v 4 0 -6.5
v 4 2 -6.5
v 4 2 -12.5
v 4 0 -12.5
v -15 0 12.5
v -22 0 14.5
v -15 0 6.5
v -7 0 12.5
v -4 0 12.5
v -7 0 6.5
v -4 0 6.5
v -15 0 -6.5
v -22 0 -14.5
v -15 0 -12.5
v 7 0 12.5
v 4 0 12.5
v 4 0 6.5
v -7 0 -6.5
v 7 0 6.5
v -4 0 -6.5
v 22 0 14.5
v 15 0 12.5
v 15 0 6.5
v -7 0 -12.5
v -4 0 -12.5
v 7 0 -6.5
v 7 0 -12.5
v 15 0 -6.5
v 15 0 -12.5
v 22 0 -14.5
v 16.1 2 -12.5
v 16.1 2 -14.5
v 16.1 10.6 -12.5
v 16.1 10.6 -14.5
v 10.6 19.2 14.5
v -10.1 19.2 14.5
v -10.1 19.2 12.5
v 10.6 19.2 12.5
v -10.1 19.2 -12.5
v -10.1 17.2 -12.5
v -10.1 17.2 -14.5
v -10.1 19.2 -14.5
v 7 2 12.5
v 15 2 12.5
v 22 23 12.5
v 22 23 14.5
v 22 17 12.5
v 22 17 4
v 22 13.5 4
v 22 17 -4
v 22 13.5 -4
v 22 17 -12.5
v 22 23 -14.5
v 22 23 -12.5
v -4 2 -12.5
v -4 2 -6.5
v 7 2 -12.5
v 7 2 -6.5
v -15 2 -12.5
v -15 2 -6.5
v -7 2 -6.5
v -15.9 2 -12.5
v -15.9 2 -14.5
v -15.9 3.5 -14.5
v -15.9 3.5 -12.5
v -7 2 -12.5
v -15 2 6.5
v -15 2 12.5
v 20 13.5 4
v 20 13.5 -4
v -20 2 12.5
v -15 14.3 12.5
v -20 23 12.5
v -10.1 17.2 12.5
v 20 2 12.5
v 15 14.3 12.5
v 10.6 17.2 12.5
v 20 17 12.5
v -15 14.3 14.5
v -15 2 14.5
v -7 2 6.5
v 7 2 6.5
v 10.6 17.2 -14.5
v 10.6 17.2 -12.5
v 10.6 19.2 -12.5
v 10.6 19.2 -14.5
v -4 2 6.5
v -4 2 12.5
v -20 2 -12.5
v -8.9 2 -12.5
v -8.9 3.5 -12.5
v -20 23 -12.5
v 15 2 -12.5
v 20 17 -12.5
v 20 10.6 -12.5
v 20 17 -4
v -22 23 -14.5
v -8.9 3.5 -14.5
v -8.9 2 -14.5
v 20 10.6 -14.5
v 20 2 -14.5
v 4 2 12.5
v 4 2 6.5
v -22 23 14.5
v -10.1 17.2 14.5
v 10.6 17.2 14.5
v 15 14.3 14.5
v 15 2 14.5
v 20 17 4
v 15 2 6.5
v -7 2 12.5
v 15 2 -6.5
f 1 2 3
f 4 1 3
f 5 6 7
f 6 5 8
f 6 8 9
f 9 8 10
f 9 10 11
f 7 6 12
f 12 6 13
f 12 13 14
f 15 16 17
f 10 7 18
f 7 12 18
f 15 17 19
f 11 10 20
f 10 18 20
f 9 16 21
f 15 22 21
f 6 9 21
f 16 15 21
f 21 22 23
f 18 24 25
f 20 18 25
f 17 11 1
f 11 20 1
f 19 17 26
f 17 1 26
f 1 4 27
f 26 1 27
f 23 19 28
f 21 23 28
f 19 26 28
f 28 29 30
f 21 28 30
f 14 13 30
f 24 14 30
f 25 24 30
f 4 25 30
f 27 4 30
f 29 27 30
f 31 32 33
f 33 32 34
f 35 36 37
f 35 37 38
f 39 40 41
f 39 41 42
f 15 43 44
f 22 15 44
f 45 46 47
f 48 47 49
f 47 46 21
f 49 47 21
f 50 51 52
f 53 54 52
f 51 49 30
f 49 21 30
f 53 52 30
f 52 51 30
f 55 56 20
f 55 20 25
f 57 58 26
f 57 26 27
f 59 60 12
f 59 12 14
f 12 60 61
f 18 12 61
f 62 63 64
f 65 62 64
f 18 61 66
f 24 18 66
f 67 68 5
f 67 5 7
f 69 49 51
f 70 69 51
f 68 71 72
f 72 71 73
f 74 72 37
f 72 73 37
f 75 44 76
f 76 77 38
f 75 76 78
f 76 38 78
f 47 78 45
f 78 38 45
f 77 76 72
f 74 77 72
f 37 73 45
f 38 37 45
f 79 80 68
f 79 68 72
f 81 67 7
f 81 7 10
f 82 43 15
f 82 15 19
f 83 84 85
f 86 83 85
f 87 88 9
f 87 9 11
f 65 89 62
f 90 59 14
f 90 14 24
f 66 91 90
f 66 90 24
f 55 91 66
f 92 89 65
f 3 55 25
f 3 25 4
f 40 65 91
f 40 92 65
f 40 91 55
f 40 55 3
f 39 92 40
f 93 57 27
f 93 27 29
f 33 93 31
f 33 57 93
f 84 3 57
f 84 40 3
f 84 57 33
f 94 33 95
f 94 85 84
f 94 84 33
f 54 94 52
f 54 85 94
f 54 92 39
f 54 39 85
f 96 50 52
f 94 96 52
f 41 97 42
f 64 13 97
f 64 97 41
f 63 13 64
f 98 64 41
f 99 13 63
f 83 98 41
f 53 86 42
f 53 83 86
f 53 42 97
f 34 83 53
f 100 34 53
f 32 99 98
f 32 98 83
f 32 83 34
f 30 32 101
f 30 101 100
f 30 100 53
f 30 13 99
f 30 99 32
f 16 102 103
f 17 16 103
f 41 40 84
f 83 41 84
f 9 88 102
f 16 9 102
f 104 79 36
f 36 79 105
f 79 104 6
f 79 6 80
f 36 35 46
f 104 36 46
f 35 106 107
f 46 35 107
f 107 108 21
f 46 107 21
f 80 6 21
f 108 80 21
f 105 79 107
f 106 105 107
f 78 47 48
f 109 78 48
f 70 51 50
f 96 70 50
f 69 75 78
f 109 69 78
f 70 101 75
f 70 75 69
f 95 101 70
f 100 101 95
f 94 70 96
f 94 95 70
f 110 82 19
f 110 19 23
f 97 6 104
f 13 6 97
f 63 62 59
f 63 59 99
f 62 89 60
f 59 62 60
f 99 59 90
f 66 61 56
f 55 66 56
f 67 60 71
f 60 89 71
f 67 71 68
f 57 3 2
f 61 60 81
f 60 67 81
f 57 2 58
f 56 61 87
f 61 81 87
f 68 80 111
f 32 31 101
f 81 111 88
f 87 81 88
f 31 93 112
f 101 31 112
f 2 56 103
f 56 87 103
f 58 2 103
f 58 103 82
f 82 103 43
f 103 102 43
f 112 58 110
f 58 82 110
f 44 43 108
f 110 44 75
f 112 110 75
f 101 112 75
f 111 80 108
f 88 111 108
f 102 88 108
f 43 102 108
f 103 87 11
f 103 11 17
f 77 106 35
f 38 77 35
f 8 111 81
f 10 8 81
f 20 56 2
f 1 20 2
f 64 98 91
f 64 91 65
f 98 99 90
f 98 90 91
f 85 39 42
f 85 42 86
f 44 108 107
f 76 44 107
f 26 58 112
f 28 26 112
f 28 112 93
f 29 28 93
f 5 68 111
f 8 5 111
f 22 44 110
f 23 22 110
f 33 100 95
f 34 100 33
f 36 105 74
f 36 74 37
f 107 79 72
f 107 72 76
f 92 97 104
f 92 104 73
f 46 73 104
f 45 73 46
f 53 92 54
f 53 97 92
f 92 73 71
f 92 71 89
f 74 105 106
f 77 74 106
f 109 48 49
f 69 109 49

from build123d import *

# Parameters (mm, degrees)
SKETCH2_W           = 44
SKETCH2_H           = 29
BOSS_EXTRUDE1_DEPTH = 23
SKETCH3_W           = 40
SKETCH3_H           = 25
CUT_EXTRUDE1_DEPTH  = 21
SKETCH4_W           = 20.7
SKETCH4_H           = 2
CUT_EXTRUDE2_DEPTH  = 33
SKETCH5_W           = 30
SKETCH5_H           = 12.3
CUT_EXTRUDE3_DEPTH  = 2
CUT_EXTRUDE5_DEPTH  = 2
SKETCH11_W          = 3.9
SKETCH11_H          = 8.6
SKETCH11_W_2        = 7
SKETCH11_H_2        = 1.5
CUT_EXTRUDE6_DEPTH  = 2
SKETCH13_W          = 8
SKETCH13_H          = 6
CUT_EXTRUDE8_DEPTH  = 2


with BuildPart() as part:
    # Sketch2 → Boss-Extrude1 (new body)
    with BuildSketch(Plane(origin=(0, 0, 0), x_dir=(1, 0, 0), z_dir=(0, 1, 0))):
        Rectangle(SKETCH2_W, SKETCH2_H)
    extrude(amount=BOSS_EXTRUDE1_DEPTH)

    # Sketch3 → Cut-Extrude1 (cut)
    with BuildSketch(Plane(origin=(0, 23, 0), x_dir=(1, 0, 0), z_dir=(0, 1, 0))):
        Rectangle(SKETCH3_W, SKETCH3_H)
    extrude(amount=-CUT_EXTRUDE1_DEPTH, mode=Mode.SUBTRACT)

    # Sketch4 → Cut-Extrude2 (cut)
    with BuildSketch(Plane.XY.offset(14.5)):
        with Locations((0.25, 18.2)):
            Rectangle(SKETCH4_W, SKETCH4_H)
    extrude(amount=-CUT_EXTRUDE2_DEPTH, mode=Mode.SUBTRACT)

    # Sketch5 → Cut-Extrude3 (cut)
    with BuildSketch(Plane.XY.offset(14.5)):
        with Locations((0, 8.15)):
            Rectangle(SKETCH5_W, SKETCH5_H)
    extrude(amount=-CUT_EXTRUDE3_DEPTH, mode=Mode.SUBTRACT)

    # Sketch8 → Cut-Extrude5 (cut)
    with BuildSketch(Plane(origin=(22, 0, 0), x_dir=(0, 0, -1), z_dir=(1, 0, 0))):
        Polygon((-12.5, 17), (-4, 17), (-4, 13.5), (4, 13.5), (4, 17), (12.5, 17), (12.5, 23), (-12.5, 23), align=None)
    extrude(amount=-CUT_EXTRUDE5_DEPTH, mode=Mode.SUBTRACT)

    # Sketch11 → Cut-Extrude6 (cut)
    with BuildSketch(Plane(origin=(0, 0, -14.5), x_dir=(-1, 0, 0), z_dir=(0, 0, -1))):
        with Locations((-18.05, 6.3)):
            Rectangle(SKETCH11_W, SKETCH11_H)
        with Locations((12.4, 2.75)):
            Rectangle(SKETCH11_W_2, SKETCH11_H_2)
    extrude(amount=-CUT_EXTRUDE6_DEPTH, mode=Mode.SUBTRACT)

    # Sketch13 → Cut-Extrude8 (cut)
    with BuildSketch(Plane(origin=(0, 2, 0), x_dir=(1, 0, 0), z_dir=(0, 1, 0))):
        with Locations((-11, -9.5)):
            Rectangle(SKETCH13_W, SKETCH13_H)
        with Locations((0, -9.5)):
            Rectangle(SKETCH13_W, SKETCH13_H)
        with Locations((11, 9.5)):
            Rectangle(SKETCH13_W, SKETCH13_H)
        with Locations((11, -9.5)):
            Rectangle(SKETCH13_W, SKETCH13_H)
        with Locations((-11, 9.5)):
            Rectangle(SKETCH13_W, SKETCH13_H)
        with Locations((0, 9.5)):
            Rectangle(SKETCH13_W, SKETCH13_H)
    extrude(amount=-CUT_EXTRUDE8_DEPTH, mode=Mode.SUBTRACT)


solid = part.part
